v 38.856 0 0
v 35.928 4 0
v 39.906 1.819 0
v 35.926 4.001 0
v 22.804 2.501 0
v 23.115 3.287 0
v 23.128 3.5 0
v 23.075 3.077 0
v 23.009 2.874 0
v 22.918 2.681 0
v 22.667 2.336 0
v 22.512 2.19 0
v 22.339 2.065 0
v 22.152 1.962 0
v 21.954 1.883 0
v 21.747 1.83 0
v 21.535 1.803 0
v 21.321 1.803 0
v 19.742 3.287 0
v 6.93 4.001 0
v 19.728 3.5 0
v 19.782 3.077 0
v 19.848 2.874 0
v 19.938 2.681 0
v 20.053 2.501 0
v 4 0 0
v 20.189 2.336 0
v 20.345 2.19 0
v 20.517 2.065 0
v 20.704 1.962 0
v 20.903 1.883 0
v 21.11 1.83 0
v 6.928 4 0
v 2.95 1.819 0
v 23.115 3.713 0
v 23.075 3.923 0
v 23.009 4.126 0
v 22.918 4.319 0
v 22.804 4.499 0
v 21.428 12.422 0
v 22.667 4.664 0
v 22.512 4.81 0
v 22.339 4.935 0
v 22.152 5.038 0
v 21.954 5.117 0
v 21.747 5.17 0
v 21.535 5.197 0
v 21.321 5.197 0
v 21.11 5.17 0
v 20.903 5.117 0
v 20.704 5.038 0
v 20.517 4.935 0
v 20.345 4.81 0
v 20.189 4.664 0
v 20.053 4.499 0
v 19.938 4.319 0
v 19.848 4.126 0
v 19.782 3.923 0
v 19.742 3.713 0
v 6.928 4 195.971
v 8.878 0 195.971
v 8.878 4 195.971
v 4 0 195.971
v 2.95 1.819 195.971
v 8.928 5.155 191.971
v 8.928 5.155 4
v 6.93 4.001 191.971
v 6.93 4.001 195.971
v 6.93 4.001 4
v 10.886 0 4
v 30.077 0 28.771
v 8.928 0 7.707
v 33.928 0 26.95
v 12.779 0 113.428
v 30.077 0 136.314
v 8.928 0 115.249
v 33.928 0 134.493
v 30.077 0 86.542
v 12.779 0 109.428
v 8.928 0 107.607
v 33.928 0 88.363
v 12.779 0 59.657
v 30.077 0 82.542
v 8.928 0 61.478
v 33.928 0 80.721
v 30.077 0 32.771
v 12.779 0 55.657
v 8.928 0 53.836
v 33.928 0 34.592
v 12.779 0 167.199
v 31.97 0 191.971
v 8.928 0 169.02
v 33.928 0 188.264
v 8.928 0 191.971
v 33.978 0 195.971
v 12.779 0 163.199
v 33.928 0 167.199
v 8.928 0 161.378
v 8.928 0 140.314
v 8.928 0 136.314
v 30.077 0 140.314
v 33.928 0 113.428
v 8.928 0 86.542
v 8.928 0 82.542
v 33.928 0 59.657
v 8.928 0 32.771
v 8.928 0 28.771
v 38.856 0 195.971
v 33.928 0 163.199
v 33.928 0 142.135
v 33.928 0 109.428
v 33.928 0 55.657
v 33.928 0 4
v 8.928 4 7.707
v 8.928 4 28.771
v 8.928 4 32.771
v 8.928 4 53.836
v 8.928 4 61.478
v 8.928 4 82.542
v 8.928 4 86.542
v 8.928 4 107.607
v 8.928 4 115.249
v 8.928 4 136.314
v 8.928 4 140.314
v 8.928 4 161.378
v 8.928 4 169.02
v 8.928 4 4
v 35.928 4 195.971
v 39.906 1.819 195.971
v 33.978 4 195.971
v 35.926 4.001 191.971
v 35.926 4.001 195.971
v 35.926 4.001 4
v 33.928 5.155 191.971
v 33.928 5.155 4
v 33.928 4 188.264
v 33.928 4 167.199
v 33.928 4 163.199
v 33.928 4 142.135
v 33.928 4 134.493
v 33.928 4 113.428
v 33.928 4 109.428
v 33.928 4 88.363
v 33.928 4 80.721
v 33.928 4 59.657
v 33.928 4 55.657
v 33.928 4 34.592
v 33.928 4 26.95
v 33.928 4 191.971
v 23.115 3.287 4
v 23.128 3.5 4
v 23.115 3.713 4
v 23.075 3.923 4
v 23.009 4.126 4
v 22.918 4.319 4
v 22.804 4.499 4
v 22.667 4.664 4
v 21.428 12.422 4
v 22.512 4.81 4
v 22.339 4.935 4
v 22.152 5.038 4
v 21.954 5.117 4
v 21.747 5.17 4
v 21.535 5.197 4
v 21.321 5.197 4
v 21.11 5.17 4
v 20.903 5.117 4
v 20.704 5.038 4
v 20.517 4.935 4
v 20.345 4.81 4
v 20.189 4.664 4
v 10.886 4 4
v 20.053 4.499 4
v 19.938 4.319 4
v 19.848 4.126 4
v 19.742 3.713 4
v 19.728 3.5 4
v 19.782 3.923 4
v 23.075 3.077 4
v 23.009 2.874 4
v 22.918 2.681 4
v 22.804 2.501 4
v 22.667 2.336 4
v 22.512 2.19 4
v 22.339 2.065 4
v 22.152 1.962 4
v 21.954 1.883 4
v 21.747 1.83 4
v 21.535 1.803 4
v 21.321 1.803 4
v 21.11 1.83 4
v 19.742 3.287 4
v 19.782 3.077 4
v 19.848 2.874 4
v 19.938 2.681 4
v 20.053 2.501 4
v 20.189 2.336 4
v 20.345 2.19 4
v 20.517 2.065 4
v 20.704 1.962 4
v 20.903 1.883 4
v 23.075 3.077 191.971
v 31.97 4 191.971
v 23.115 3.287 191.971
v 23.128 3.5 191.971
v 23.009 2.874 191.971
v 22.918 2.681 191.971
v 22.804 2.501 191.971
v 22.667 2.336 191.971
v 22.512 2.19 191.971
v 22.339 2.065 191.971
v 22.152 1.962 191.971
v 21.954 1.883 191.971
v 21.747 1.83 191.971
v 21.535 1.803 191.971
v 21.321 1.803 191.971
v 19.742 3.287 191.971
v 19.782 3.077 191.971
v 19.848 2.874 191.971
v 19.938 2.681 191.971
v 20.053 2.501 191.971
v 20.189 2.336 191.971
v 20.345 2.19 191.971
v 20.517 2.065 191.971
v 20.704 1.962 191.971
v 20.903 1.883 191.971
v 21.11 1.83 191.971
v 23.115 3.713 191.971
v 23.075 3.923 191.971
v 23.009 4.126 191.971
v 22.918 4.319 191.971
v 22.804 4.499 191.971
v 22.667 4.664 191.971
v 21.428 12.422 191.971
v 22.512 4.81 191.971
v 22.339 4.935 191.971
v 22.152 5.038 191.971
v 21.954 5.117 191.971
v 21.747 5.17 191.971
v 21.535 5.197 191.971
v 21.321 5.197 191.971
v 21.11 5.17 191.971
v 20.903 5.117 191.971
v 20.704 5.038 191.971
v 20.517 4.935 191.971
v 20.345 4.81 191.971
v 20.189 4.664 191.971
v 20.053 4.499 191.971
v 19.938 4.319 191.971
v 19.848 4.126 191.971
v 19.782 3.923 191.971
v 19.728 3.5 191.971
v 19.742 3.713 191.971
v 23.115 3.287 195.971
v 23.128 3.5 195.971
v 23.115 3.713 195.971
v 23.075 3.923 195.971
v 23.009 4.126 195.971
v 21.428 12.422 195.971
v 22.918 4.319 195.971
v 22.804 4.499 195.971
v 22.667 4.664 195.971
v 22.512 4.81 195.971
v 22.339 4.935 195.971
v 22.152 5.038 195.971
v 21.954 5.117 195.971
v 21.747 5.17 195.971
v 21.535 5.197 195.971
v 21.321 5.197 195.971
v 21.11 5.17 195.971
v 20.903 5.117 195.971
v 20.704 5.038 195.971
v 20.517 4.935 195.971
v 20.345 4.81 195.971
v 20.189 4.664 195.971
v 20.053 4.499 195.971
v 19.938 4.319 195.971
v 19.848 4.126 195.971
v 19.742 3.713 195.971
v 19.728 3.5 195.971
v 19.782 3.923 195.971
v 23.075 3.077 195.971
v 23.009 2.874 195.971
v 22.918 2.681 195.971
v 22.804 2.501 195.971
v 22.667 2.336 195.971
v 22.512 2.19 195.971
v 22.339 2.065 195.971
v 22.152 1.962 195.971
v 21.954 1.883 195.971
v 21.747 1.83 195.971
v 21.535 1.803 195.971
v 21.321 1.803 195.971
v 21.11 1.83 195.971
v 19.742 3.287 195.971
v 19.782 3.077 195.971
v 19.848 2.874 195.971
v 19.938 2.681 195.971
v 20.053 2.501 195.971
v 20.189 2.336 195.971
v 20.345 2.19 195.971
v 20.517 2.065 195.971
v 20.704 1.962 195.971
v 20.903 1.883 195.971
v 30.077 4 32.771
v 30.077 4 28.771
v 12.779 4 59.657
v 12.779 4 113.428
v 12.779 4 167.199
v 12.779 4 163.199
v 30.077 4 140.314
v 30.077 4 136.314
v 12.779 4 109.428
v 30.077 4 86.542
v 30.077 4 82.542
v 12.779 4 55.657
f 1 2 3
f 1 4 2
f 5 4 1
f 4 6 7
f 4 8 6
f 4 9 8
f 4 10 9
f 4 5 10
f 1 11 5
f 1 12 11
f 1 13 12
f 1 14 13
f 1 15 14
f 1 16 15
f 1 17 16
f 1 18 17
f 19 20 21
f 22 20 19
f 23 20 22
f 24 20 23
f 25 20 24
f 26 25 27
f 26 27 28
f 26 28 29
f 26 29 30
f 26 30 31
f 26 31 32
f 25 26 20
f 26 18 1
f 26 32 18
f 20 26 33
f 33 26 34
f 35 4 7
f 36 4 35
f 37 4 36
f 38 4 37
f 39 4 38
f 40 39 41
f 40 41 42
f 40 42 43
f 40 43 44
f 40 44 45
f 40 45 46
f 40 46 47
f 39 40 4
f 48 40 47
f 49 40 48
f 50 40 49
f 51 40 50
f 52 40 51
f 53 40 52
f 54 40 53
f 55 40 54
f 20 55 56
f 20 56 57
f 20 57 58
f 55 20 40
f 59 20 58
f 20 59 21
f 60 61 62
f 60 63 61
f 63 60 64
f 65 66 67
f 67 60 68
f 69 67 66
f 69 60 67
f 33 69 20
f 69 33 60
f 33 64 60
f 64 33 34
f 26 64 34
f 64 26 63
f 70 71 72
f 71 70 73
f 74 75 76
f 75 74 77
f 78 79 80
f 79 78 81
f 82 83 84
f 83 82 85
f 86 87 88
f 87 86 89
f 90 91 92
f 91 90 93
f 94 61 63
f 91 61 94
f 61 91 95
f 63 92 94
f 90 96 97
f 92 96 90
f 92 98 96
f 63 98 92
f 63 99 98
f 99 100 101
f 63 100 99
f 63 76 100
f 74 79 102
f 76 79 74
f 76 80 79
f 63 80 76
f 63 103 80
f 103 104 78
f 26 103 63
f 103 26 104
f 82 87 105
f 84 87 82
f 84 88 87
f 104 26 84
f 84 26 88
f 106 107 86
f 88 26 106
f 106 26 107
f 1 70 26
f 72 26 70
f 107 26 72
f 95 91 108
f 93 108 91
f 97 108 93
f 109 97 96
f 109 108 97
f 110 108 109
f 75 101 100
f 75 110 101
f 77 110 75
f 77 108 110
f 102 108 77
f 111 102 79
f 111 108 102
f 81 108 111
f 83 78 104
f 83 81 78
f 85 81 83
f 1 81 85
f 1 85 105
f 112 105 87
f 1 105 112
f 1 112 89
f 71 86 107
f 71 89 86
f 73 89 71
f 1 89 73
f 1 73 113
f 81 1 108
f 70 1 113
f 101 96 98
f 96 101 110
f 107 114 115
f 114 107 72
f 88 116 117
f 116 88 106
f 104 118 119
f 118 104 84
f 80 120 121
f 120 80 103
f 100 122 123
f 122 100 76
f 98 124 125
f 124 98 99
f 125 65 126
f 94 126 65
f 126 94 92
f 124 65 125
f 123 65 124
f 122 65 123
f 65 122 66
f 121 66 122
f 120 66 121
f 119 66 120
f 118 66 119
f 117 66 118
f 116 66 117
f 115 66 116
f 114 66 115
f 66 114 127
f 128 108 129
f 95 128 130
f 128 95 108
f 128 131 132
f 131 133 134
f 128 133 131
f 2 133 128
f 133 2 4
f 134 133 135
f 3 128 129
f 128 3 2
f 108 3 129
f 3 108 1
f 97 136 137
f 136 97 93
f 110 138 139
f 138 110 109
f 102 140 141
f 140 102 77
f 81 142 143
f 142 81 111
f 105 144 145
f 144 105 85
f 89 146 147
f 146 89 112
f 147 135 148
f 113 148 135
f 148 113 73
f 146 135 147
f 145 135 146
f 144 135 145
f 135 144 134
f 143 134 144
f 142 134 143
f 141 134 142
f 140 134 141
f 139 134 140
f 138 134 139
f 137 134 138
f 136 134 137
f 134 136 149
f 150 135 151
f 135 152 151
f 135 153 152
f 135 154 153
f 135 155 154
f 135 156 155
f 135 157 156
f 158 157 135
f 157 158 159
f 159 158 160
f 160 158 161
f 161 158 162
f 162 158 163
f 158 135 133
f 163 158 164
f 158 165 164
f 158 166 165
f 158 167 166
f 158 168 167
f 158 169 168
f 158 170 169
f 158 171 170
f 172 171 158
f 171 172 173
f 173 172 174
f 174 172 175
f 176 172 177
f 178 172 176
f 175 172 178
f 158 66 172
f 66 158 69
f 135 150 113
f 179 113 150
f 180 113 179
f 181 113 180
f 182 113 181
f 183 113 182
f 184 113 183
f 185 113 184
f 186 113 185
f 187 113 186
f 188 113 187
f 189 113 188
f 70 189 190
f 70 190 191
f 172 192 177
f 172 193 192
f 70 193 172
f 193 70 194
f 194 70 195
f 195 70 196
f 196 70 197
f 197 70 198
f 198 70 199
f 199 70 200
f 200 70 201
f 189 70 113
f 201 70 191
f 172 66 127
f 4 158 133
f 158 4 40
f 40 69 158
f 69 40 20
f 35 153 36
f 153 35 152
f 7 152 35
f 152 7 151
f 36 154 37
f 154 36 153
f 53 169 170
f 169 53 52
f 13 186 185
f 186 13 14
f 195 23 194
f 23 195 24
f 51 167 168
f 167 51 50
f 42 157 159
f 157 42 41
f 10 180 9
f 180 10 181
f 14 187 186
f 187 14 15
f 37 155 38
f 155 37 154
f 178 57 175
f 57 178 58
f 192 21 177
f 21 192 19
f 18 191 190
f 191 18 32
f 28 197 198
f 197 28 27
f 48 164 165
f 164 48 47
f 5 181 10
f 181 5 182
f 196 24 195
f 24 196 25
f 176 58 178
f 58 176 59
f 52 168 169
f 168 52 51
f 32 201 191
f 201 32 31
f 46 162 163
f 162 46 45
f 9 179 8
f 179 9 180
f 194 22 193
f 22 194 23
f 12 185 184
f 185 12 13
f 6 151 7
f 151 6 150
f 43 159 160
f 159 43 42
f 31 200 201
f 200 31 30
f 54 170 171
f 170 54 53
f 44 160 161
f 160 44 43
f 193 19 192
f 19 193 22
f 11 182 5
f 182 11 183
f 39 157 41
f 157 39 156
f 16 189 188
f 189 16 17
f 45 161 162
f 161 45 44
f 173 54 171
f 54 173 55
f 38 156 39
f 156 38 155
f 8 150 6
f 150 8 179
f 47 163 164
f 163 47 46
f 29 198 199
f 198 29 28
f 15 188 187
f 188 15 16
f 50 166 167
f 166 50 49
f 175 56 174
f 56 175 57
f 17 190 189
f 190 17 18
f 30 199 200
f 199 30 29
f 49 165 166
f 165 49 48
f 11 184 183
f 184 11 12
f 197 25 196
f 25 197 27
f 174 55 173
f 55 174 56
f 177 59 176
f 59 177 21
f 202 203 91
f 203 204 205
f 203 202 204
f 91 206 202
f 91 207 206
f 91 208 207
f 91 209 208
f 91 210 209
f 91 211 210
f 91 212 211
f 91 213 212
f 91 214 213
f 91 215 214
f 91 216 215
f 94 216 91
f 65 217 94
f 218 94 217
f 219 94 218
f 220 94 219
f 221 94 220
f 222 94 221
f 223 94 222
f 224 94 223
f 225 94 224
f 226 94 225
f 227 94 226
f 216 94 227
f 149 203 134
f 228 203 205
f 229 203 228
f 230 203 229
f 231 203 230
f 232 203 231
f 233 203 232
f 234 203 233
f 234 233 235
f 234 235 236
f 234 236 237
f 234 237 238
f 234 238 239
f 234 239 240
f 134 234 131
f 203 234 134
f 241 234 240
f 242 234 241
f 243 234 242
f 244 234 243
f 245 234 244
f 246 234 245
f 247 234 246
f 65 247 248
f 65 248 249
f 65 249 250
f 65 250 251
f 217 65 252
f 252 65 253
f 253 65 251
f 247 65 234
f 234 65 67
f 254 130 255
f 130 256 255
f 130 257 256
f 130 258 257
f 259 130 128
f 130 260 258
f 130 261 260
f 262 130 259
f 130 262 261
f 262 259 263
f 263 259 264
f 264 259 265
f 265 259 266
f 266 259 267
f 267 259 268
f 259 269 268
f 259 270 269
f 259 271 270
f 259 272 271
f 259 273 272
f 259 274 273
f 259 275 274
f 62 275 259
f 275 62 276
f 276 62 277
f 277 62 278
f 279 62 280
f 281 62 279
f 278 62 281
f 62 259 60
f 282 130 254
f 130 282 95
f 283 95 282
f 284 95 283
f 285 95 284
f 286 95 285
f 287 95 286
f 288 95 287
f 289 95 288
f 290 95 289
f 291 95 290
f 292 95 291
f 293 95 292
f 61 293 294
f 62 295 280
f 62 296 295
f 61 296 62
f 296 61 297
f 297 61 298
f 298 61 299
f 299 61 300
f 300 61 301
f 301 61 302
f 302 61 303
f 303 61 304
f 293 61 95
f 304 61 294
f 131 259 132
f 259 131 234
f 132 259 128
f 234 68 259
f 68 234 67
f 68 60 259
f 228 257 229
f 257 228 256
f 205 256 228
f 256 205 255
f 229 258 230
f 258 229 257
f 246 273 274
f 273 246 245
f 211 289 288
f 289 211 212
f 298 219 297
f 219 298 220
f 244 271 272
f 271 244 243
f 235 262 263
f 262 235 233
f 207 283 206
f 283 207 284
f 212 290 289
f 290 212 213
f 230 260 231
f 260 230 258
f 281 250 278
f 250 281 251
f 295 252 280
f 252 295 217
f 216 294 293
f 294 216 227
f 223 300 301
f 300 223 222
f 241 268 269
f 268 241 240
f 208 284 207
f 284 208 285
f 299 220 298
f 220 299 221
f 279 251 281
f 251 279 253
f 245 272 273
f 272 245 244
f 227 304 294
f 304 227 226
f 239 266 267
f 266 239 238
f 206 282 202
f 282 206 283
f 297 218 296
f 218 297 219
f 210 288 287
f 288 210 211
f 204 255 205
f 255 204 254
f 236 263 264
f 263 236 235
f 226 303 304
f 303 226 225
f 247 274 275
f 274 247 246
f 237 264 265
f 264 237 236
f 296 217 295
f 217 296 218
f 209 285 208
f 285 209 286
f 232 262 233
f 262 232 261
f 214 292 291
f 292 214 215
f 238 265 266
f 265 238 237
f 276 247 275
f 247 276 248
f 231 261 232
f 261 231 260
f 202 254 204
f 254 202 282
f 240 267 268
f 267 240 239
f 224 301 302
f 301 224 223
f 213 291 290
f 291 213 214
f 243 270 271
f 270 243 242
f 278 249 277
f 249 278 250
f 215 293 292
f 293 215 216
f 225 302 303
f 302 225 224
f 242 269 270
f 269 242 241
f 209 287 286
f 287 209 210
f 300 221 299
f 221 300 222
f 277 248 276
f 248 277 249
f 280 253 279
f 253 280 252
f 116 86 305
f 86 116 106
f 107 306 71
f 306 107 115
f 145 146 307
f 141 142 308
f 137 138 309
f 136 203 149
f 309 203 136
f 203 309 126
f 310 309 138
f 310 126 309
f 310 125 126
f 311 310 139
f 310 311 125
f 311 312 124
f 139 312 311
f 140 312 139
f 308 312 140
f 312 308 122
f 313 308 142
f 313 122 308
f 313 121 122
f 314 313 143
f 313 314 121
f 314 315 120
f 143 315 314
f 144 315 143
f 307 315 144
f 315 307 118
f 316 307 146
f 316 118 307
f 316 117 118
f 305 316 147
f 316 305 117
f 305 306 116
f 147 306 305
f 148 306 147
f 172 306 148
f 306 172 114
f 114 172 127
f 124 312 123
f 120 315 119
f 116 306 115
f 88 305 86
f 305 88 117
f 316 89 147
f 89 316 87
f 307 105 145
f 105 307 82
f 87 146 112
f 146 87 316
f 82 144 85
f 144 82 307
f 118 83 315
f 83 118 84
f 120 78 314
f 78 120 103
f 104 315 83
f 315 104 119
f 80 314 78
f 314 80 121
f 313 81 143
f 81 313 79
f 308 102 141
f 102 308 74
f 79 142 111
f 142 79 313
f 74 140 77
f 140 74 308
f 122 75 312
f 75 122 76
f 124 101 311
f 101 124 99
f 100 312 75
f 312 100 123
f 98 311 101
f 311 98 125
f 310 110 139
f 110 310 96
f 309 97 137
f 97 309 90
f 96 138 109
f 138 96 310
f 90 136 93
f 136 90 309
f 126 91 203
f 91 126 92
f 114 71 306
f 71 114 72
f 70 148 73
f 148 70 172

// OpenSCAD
// file: triangle_truss.scad
module truss_edge_beam(beam_width, edge_extrude, total_length)
{
  edge_width = beam_width * tan(60);
  edge_bevel = beam_width / (2 * cos(60));
  bevel_x = edge_bevel - (1 + $epsilon) * beam_width * cos(60) / 2;
  bevel_y = (1 + $epsilon) * beam_width * sin(60) / 2;
  linear_extrude(height = total_length)
  {
    polygon([[edge_bevel, 0], [edge_width + edge_extrude, 0],
        [edge_width + edge_extrude, beam_width + tan(30) * edge_extrude],
        [edge_width, beam_width], [bevel_x, bevel_y]]);
  }
  echo("Main bean height:", beam_width + tan(30) * edge_extrude, "mm");
}

module truss_main_beams(beam_width, edge_extrude, inner_width, total_length)
{
  edge_width = beam_width * tan(60);
  union()
  {
    truss_edge_beam(beam_width, edge_extrude, total_length);
    translate([2*(edge_width+edge_extrude) + inner_width, 0, 0])
    {
      mirror([1, 0, 0])
      {
        truss_edge_beam(beam_width, edge_extrude, total_length);
      }
    }
  }
}

module truss_end_triangle(beam_width, edge_extrude, inner_width, screw_d, screw_position)
{
  difference()
  {
    linear_extrude(height = beam_width)
    {
      polygon([[-$epsilon, 0], [inner_width + $epsilon, 0], [inner_width + $epsilon, beam_width],
               [inner_width + edge_extrude, beam_width],
               [inner_width/2, beam_width + sqrt(3)*(inner_width + 2*edge_extrude)/6 + $epsilon], 
               [-edge_extrude, beam_width], [-$epsilon, beam_width]]);
    }

    if (screw_position == 0)
    {
      translate([inner_width - (2 + screw_d/2), 2 + screw_d/2, -$epsilon])
      {
        cylinder(h=beam_width + 2*$epsilon, r=(screw_d/2 + $padding), center=false);
      }
    }
    else
    {
      translate([inner_width/2, 2 + screw_d/2, -$epsilon])
      {
        cylinder(h=beam_width + 2*$epsilon, r=(screw_d/2 + $padding), center=false);
      }
    }
  }
}

module truss_sweep(beam_width, edge_extrude, inner_width, num_inner_beams, inner_beam_angle, top)
{
  inner_beam_length = inner_width / tan(inner_beam_angle);
  inner_beam_offset = beam_width / sin(inner_beam_angle);
  total_length = beam_width + num_inner_beams*inner_beam_length +
                 inner_beam_offset + (num_inner_beams - 1)*inner_beam_offset/3;

  for (i = [0 : 1.0: num_inner_beams - 1])
  {
    translate([0, beam_width, beam_width/2 + i*(inner_beam_length+inner_beam_offset/3)])
    {
      union()
      {
        if (top == 1 && i > 0)
        {
          translate([-$epsilon, -beam_width, inner_beam_offset/3 - beam_width/2])
          cube([inner_width + 2*$epsilon, beam_width, beam_width]);
        }
        if (i % 2 == 0)
        {
          rotate([90, 0, 0])
          {
            linear_extrude(height=beam_width)
            {
              polygon([[-$epsilon, 0], [inner_width + $epsilon, inner_beam_length],
                       [inner_width + $epsilon, inner_beam_length + inner_beam_offset],
                       [-$epsilon, inner_beam_offset]]);
            }
          }
        }
        else
        {
          rotate([90, 0, 0])
          {
            linear_extrude(height=beam_width)
            {
              polygon([[inner_width + $epsilon, 0], [-$epsilon, inner_beam_length],
                       [-$epsilon, inner_beam_length + inner_beam_offset],
                       [inner_width + $epsilon, inner_beam_offset]]);
            }
          }
        }
      }
    }
  }
}

module triangle_truss_face(beam_width, edge_extrude, num_inner_beams, inner_beam_angle, inner_width, screw_d, screw_position, top)
{
  edge_width = beam_width * tan(60);
  inner_beam_length = inner_width / tan(inner_beam_angle);
  inner_beam_offset = beam_width / sin(inner_beam_angle);

  total_length = beam_width + num_inner_beams*inner_beam_length +
                 inner_beam_offset + (num_inner_beams - 1)*inner_beam_offset/3;
  union()
  {
    truss_main_beams(beam_width, edge_extrude, inner_width, total_length);

    translate([edge_width + edge_extrude, 0, 0])
    {
      union()
      {
        truss_end_triangle(beam_width, edge_extrude, inner_width, screw_d, screw_position);
        translate([0, 0, total_length - beam_width])
        {
          truss_end_triangle(beam_width, edge_extrude, inner_width, screw_d, screw_position);
        }

        truss_sweep(beam_width, edge_extrude, inner_width, num_inner_beams, inner_beam_angle, top);
      }
    }
  }
}

module triangle_truss(beam_width, edge_extrude, num_inner_beams, inner_beam_angle, inner_width, screw_d, screw_position)
{
  edge_width = beam_width * tan(60);
  total_width = 2*(edge_width+edge_extrude) + inner_width;

  union()
  {
    triangle_truss_face(beam_width, edge_extrude, num_inner_beams, inner_beam_angle, inner_width, screw_d, screw_position, 1);

    translate([total_width, 0, 0])
    {
      rotate([0, 0, 120])
      {
        triangle_truss_face(beam_width, edge_extrude, num_inner_beams, inner_beam_angle, inner_width, screw_d, screw_position, 1);
      }
    }

    rotate([0, 0, -120])
    {
      mirror([1, 0, 0])
      translate([0, 0, 0])
      {
        triangle_truss_face(beam_width, edge_extrude, num_inner_beams, inner_beam_angle, inner_width, screw_d, screw_position, 1);
      }
    }
  }
}

module triangle_truss_dims(beam_width, edge_extrude, num_inner_beams, inner_beam_angle, inner_width)
{
  inner_beam_length = inner_width / tan(inner_beam_angle);
  inner_beam_offset = beam_width / sin(inner_beam_angle);

  total_length = beam_width + num_inner_beams*inner_beam_length +
                 inner_beam_offset + (num_inner_beams - 1)*inner_beam_offset/3;

  edge_width = beam_width * tan(60);
  edge_bevel = beam_width / (2 * cos(60));
  bevel_x = edge_bevel - beam_width * cos(60);

  total_width = 2*(edge_width - edge_bevel + bevel_x) +
                2*edge_extrude + inner_width;

  echo("Truss length: ", total_length, " mm");
  echo("Truss width: ", total_width, " mm");
}
// main file
$fn = 50;
$epsilon = 0.05;
$padding = 0.2;

use <triangle_truss.scad>

// triangle_truss(beam_width, edge_extrude, num_inner_beams, inner_beam_angle, inner_width);

beam_width = 4;
edge_extrude = 2;
num_inner_beams = 7;
inner_beam_angle = 45;
inner_width = 25;
screw_d = 3;
screw_position = 1;

triangle_truss_face(beam_width, edge_extrude, num_inner_beams, inner_beam_angle, inner_width, screw_d, screw_position, 1);
//triangle_truss(beam_width, edge_extrude, num_inner_beams, inner_beam_angle, inner_width, screw_d, screw_position);
triangle_truss_dims(beam_width, edge_extrude, num_inner_beams, inner_beam_angle, inner_width);
